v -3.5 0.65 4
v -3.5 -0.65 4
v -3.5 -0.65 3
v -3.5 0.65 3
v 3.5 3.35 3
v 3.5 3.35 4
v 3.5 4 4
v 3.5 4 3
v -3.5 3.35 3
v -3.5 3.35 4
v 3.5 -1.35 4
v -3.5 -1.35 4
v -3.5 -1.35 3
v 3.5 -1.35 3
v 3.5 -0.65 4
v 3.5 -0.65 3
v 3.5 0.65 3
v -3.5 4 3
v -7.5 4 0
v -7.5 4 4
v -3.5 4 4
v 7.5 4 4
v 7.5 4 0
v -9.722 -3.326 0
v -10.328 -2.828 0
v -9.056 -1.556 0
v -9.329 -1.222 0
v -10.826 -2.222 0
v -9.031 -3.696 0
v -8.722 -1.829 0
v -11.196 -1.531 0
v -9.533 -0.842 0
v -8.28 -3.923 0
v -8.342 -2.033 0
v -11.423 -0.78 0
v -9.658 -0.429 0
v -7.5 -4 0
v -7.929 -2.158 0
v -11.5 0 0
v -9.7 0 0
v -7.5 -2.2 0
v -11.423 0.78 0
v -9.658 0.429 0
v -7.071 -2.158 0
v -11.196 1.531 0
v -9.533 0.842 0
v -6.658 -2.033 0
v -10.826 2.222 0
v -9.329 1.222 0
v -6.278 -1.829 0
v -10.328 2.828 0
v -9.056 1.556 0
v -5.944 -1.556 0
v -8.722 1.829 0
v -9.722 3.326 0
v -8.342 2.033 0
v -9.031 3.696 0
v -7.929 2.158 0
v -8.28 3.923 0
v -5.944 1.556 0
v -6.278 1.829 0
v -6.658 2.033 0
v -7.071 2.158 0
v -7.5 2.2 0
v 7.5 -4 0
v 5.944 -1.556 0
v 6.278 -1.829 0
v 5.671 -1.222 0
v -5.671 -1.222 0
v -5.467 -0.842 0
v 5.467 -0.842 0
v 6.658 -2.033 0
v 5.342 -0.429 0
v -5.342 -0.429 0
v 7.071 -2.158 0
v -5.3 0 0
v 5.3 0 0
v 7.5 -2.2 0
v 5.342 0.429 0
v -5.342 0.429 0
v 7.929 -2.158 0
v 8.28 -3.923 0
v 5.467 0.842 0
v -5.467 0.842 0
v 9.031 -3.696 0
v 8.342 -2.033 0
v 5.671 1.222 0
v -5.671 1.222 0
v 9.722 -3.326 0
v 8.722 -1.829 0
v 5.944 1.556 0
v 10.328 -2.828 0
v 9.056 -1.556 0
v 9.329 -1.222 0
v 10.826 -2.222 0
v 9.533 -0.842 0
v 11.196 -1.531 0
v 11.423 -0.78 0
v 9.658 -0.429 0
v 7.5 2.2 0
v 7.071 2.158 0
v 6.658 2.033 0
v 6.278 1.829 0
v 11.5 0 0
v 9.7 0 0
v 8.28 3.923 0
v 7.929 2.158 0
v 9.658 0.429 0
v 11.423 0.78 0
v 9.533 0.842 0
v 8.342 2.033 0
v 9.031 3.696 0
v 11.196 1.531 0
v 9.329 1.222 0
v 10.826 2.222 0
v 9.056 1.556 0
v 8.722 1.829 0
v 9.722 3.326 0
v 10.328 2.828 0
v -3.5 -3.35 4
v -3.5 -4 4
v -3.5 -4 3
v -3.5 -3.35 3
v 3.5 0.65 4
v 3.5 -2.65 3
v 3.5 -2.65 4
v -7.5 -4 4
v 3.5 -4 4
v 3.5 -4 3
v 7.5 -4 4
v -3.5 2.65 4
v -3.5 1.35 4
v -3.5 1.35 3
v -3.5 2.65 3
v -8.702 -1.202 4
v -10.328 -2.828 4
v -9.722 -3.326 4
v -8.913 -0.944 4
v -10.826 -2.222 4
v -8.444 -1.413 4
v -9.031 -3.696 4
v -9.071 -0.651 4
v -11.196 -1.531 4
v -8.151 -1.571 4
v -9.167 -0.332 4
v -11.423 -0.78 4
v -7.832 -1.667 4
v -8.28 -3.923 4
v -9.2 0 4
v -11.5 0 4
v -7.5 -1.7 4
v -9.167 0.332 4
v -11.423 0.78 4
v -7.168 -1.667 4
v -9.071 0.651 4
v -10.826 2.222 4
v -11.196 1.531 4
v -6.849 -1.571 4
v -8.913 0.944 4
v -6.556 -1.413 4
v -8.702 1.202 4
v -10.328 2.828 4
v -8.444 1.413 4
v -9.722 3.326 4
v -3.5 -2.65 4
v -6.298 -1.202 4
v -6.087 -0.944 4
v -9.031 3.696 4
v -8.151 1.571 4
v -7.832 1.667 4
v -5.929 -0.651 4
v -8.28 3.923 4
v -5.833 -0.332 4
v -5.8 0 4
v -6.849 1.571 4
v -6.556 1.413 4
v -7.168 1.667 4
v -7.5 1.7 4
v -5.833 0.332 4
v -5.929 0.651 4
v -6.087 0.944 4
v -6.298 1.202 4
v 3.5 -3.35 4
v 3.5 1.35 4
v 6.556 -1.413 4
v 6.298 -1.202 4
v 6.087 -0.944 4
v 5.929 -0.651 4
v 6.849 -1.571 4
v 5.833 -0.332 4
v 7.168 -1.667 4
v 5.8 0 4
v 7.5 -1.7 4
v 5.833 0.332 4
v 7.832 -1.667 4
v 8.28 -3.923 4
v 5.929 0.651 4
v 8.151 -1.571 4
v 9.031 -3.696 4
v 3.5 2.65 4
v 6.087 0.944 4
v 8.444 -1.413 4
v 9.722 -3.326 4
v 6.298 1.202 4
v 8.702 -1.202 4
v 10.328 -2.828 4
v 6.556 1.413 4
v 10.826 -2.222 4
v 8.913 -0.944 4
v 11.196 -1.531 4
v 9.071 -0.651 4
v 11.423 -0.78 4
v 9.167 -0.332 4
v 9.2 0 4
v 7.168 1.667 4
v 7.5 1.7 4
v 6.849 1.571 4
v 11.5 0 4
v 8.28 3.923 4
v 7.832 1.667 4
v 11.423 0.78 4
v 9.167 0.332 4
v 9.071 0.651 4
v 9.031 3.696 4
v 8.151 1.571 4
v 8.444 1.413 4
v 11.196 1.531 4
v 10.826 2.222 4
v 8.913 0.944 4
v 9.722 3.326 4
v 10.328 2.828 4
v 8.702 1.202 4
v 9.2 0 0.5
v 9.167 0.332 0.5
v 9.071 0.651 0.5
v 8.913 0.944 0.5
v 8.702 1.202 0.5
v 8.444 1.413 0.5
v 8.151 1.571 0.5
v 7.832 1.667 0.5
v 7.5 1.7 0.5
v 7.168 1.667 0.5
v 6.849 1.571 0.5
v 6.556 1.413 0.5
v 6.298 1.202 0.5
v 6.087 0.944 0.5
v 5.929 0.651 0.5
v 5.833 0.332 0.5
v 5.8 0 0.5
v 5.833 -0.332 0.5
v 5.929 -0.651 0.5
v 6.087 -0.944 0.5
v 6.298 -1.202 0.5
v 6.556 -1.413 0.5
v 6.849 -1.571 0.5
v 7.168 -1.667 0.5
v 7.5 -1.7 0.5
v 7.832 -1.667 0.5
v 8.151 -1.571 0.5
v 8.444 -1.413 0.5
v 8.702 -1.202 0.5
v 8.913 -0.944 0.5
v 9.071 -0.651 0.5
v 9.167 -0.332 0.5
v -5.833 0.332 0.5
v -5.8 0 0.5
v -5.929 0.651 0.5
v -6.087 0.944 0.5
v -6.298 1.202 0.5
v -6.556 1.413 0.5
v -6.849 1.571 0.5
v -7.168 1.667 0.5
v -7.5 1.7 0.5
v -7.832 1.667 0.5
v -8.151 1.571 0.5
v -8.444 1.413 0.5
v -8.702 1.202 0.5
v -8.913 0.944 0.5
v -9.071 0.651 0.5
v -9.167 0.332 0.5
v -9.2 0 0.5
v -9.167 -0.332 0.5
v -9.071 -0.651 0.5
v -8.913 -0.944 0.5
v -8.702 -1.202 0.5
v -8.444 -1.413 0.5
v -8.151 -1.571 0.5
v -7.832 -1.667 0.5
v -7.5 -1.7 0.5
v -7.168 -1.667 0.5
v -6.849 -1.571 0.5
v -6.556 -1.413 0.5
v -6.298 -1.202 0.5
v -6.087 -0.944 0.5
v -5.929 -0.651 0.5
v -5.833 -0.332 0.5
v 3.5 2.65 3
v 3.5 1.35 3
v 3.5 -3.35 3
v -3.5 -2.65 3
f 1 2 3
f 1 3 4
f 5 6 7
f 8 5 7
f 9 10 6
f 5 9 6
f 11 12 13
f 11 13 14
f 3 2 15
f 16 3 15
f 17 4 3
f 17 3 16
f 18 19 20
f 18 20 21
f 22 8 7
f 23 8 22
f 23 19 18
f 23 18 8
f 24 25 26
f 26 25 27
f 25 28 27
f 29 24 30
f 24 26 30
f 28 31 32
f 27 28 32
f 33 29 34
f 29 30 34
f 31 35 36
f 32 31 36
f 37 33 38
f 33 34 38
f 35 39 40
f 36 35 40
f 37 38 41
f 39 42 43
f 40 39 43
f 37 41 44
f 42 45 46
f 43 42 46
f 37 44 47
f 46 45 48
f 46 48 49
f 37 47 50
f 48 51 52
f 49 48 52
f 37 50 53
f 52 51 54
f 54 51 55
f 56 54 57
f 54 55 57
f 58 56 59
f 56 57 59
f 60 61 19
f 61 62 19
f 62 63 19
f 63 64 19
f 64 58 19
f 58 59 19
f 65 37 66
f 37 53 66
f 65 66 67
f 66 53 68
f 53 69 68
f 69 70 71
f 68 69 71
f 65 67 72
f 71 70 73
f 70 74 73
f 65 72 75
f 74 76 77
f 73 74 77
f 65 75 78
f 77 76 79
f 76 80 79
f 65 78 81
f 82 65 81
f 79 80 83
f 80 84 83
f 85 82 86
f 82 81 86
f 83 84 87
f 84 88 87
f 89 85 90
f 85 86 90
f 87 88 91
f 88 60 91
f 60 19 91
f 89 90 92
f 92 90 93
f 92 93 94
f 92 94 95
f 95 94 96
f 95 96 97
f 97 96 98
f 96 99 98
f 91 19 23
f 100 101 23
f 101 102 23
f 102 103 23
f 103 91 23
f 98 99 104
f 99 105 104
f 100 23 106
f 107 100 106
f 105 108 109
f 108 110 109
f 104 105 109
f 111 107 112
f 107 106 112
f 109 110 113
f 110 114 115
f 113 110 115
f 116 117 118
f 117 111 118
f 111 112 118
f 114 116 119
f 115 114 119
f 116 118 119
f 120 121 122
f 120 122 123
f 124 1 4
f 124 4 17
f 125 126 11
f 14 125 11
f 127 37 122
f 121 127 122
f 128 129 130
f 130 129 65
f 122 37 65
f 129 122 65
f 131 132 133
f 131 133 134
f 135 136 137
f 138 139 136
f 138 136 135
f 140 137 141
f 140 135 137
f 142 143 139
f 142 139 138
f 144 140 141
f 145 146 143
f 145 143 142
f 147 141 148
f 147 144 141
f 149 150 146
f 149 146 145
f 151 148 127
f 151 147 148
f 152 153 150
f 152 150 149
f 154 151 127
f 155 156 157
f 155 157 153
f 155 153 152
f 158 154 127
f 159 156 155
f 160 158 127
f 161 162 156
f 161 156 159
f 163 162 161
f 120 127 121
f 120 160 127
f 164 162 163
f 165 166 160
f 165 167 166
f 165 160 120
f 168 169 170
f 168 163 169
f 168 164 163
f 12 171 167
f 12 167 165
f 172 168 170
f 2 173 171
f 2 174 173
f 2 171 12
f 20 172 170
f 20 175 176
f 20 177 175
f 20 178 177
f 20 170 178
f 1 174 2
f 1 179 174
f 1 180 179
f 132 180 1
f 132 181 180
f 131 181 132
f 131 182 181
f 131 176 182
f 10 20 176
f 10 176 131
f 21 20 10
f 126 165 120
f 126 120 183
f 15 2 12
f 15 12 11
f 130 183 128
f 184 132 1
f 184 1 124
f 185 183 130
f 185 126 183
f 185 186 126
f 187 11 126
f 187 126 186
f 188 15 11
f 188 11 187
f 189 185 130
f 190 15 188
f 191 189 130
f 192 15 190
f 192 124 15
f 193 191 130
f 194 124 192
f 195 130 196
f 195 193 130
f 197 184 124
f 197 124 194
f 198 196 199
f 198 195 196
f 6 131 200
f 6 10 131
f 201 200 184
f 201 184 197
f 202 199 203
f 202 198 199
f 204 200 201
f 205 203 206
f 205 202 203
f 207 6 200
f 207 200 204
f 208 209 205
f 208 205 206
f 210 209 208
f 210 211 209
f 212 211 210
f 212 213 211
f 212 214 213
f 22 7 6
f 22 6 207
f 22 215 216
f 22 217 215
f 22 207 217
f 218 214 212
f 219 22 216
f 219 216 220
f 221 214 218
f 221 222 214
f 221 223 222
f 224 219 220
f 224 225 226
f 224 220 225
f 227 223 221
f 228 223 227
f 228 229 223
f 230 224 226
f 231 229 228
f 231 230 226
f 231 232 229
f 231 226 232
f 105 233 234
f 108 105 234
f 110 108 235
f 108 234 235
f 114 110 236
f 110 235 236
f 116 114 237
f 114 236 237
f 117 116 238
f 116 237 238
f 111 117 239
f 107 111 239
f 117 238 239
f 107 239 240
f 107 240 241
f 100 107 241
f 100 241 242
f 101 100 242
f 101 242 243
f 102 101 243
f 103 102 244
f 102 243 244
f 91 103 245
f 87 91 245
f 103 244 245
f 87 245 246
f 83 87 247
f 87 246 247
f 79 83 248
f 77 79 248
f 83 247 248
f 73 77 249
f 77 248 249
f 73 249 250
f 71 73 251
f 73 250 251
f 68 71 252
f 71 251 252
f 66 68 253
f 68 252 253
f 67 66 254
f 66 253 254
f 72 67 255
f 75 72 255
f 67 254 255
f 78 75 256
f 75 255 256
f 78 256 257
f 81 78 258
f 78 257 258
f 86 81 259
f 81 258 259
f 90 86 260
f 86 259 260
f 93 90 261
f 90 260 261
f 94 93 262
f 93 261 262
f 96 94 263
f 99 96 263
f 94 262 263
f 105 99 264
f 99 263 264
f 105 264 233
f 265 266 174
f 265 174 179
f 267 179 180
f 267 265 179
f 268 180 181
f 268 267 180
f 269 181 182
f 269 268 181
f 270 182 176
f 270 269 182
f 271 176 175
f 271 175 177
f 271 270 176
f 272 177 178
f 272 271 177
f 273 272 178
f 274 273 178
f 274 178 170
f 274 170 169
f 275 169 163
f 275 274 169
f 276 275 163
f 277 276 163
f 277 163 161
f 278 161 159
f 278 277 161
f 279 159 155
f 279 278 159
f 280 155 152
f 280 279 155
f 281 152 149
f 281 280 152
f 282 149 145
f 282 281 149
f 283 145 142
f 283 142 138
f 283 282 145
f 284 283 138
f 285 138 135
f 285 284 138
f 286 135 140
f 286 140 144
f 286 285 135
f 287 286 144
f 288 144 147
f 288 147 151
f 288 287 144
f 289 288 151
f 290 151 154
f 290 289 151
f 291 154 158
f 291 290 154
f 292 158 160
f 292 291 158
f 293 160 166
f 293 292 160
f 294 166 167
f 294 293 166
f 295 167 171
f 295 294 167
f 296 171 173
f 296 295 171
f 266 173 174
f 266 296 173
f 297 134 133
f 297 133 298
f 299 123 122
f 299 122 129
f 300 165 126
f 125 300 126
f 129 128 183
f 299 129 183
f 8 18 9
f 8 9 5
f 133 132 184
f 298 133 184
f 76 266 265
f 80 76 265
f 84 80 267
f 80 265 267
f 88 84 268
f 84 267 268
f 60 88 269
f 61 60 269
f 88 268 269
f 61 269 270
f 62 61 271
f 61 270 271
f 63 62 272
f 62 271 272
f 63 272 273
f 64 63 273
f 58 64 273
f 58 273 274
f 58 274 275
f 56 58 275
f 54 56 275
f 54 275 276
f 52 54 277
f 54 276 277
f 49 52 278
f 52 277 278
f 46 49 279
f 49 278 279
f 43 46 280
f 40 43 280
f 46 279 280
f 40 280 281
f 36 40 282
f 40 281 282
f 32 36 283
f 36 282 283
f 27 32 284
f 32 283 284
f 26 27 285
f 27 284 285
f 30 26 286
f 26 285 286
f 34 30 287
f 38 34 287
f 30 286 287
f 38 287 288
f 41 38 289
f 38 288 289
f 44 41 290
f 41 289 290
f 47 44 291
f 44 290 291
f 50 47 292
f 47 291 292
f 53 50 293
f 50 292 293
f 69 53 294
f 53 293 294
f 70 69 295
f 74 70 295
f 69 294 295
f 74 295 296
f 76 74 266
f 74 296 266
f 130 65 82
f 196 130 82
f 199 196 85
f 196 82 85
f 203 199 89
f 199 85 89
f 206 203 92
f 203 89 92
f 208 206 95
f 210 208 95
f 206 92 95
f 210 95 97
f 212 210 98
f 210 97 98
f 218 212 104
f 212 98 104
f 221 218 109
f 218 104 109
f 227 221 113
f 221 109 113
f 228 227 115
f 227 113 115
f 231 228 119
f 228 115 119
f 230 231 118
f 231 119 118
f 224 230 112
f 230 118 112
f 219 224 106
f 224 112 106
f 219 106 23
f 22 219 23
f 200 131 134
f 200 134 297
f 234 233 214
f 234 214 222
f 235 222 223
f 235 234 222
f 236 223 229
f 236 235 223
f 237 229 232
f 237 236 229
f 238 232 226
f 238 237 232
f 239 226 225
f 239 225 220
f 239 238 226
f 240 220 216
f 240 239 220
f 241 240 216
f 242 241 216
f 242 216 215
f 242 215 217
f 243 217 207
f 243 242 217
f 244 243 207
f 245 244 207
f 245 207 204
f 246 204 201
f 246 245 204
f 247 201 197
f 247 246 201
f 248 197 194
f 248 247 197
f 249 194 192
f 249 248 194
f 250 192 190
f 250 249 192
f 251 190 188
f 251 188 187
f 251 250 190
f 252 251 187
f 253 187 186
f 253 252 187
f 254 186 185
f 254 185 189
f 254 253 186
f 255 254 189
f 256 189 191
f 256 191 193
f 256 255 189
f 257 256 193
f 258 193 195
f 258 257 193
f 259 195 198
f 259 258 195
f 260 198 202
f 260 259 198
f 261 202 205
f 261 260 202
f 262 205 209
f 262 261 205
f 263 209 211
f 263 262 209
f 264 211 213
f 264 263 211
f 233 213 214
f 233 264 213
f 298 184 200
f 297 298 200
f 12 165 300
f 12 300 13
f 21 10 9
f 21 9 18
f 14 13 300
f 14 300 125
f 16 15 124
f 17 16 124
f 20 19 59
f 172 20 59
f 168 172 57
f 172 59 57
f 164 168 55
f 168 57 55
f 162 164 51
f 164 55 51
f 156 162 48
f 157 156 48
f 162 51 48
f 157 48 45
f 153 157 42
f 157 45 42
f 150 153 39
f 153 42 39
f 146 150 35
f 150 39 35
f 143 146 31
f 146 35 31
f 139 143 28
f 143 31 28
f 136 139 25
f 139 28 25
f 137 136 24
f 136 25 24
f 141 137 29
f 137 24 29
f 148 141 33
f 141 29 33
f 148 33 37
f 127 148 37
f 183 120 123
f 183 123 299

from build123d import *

# Parameters (mm, degrees)
SKETCH_R     = 1.7
PAD_DEPTH    = 4
SKETCH001_W  = 7
SKETCH001_H  = 1.3
POCKET_DEPTH = 1
CHAMFER_SIZE = 0.5


with BuildPart() as part:
    # Sketch → Pad (new body)
    with BuildSketch(Plane.XY):
        with BuildLine():
            ThreePointArc((-7.5, 4), (-11.5, 0), (-7.5, -4))
            Line((-7.5, -4), (7.5, -4))
            ThreePointArc((7.5, -4), (11.5, 0), (7.5, 4))
            Line((-7.5, 4), (7.5, 4))
        make_face()
        with Locations((-7.5, 0)):
            Circle(SKETCH_R, mode=Mode.SUBTRACT)
        with Locations((7.5, 0)):
            Circle(SKETCH_R, mode=Mode.SUBTRACT)
    extrude(amount=PAD_DEPTH)

    # Sketch001 → Pocket (cut)
    with BuildSketch(Plane.XY.offset(4)):
        with Locations((0, 2)):
            Rectangle(SKETCH001_W, SKETCH001_H)
        Rectangle(SKETCH001_W, SKETCH001_H)
        with Locations((0, -2)):
            Rectangle(SKETCH001_W, SKETCH001_H)
        with Locations((0, 4)):
            Rectangle(SKETCH001_W, SKETCH001_H)
        with Locations((0, -4)):
            Rectangle(SKETCH001_W, SKETCH001_H)
    extrude(amount=-POCKET_DEPTH, mode=Mode.SUBTRACT)

    # Chamfer
    chamfer_edges = [part.edges().sort_by_distance(p)[0] for p in [
        (-9.2, 0, 0),
        (5.8, 0, 0),
    ]]
    chamfer(chamfer_edges, length=CHAMFER_SIZE)


solid = part.part
